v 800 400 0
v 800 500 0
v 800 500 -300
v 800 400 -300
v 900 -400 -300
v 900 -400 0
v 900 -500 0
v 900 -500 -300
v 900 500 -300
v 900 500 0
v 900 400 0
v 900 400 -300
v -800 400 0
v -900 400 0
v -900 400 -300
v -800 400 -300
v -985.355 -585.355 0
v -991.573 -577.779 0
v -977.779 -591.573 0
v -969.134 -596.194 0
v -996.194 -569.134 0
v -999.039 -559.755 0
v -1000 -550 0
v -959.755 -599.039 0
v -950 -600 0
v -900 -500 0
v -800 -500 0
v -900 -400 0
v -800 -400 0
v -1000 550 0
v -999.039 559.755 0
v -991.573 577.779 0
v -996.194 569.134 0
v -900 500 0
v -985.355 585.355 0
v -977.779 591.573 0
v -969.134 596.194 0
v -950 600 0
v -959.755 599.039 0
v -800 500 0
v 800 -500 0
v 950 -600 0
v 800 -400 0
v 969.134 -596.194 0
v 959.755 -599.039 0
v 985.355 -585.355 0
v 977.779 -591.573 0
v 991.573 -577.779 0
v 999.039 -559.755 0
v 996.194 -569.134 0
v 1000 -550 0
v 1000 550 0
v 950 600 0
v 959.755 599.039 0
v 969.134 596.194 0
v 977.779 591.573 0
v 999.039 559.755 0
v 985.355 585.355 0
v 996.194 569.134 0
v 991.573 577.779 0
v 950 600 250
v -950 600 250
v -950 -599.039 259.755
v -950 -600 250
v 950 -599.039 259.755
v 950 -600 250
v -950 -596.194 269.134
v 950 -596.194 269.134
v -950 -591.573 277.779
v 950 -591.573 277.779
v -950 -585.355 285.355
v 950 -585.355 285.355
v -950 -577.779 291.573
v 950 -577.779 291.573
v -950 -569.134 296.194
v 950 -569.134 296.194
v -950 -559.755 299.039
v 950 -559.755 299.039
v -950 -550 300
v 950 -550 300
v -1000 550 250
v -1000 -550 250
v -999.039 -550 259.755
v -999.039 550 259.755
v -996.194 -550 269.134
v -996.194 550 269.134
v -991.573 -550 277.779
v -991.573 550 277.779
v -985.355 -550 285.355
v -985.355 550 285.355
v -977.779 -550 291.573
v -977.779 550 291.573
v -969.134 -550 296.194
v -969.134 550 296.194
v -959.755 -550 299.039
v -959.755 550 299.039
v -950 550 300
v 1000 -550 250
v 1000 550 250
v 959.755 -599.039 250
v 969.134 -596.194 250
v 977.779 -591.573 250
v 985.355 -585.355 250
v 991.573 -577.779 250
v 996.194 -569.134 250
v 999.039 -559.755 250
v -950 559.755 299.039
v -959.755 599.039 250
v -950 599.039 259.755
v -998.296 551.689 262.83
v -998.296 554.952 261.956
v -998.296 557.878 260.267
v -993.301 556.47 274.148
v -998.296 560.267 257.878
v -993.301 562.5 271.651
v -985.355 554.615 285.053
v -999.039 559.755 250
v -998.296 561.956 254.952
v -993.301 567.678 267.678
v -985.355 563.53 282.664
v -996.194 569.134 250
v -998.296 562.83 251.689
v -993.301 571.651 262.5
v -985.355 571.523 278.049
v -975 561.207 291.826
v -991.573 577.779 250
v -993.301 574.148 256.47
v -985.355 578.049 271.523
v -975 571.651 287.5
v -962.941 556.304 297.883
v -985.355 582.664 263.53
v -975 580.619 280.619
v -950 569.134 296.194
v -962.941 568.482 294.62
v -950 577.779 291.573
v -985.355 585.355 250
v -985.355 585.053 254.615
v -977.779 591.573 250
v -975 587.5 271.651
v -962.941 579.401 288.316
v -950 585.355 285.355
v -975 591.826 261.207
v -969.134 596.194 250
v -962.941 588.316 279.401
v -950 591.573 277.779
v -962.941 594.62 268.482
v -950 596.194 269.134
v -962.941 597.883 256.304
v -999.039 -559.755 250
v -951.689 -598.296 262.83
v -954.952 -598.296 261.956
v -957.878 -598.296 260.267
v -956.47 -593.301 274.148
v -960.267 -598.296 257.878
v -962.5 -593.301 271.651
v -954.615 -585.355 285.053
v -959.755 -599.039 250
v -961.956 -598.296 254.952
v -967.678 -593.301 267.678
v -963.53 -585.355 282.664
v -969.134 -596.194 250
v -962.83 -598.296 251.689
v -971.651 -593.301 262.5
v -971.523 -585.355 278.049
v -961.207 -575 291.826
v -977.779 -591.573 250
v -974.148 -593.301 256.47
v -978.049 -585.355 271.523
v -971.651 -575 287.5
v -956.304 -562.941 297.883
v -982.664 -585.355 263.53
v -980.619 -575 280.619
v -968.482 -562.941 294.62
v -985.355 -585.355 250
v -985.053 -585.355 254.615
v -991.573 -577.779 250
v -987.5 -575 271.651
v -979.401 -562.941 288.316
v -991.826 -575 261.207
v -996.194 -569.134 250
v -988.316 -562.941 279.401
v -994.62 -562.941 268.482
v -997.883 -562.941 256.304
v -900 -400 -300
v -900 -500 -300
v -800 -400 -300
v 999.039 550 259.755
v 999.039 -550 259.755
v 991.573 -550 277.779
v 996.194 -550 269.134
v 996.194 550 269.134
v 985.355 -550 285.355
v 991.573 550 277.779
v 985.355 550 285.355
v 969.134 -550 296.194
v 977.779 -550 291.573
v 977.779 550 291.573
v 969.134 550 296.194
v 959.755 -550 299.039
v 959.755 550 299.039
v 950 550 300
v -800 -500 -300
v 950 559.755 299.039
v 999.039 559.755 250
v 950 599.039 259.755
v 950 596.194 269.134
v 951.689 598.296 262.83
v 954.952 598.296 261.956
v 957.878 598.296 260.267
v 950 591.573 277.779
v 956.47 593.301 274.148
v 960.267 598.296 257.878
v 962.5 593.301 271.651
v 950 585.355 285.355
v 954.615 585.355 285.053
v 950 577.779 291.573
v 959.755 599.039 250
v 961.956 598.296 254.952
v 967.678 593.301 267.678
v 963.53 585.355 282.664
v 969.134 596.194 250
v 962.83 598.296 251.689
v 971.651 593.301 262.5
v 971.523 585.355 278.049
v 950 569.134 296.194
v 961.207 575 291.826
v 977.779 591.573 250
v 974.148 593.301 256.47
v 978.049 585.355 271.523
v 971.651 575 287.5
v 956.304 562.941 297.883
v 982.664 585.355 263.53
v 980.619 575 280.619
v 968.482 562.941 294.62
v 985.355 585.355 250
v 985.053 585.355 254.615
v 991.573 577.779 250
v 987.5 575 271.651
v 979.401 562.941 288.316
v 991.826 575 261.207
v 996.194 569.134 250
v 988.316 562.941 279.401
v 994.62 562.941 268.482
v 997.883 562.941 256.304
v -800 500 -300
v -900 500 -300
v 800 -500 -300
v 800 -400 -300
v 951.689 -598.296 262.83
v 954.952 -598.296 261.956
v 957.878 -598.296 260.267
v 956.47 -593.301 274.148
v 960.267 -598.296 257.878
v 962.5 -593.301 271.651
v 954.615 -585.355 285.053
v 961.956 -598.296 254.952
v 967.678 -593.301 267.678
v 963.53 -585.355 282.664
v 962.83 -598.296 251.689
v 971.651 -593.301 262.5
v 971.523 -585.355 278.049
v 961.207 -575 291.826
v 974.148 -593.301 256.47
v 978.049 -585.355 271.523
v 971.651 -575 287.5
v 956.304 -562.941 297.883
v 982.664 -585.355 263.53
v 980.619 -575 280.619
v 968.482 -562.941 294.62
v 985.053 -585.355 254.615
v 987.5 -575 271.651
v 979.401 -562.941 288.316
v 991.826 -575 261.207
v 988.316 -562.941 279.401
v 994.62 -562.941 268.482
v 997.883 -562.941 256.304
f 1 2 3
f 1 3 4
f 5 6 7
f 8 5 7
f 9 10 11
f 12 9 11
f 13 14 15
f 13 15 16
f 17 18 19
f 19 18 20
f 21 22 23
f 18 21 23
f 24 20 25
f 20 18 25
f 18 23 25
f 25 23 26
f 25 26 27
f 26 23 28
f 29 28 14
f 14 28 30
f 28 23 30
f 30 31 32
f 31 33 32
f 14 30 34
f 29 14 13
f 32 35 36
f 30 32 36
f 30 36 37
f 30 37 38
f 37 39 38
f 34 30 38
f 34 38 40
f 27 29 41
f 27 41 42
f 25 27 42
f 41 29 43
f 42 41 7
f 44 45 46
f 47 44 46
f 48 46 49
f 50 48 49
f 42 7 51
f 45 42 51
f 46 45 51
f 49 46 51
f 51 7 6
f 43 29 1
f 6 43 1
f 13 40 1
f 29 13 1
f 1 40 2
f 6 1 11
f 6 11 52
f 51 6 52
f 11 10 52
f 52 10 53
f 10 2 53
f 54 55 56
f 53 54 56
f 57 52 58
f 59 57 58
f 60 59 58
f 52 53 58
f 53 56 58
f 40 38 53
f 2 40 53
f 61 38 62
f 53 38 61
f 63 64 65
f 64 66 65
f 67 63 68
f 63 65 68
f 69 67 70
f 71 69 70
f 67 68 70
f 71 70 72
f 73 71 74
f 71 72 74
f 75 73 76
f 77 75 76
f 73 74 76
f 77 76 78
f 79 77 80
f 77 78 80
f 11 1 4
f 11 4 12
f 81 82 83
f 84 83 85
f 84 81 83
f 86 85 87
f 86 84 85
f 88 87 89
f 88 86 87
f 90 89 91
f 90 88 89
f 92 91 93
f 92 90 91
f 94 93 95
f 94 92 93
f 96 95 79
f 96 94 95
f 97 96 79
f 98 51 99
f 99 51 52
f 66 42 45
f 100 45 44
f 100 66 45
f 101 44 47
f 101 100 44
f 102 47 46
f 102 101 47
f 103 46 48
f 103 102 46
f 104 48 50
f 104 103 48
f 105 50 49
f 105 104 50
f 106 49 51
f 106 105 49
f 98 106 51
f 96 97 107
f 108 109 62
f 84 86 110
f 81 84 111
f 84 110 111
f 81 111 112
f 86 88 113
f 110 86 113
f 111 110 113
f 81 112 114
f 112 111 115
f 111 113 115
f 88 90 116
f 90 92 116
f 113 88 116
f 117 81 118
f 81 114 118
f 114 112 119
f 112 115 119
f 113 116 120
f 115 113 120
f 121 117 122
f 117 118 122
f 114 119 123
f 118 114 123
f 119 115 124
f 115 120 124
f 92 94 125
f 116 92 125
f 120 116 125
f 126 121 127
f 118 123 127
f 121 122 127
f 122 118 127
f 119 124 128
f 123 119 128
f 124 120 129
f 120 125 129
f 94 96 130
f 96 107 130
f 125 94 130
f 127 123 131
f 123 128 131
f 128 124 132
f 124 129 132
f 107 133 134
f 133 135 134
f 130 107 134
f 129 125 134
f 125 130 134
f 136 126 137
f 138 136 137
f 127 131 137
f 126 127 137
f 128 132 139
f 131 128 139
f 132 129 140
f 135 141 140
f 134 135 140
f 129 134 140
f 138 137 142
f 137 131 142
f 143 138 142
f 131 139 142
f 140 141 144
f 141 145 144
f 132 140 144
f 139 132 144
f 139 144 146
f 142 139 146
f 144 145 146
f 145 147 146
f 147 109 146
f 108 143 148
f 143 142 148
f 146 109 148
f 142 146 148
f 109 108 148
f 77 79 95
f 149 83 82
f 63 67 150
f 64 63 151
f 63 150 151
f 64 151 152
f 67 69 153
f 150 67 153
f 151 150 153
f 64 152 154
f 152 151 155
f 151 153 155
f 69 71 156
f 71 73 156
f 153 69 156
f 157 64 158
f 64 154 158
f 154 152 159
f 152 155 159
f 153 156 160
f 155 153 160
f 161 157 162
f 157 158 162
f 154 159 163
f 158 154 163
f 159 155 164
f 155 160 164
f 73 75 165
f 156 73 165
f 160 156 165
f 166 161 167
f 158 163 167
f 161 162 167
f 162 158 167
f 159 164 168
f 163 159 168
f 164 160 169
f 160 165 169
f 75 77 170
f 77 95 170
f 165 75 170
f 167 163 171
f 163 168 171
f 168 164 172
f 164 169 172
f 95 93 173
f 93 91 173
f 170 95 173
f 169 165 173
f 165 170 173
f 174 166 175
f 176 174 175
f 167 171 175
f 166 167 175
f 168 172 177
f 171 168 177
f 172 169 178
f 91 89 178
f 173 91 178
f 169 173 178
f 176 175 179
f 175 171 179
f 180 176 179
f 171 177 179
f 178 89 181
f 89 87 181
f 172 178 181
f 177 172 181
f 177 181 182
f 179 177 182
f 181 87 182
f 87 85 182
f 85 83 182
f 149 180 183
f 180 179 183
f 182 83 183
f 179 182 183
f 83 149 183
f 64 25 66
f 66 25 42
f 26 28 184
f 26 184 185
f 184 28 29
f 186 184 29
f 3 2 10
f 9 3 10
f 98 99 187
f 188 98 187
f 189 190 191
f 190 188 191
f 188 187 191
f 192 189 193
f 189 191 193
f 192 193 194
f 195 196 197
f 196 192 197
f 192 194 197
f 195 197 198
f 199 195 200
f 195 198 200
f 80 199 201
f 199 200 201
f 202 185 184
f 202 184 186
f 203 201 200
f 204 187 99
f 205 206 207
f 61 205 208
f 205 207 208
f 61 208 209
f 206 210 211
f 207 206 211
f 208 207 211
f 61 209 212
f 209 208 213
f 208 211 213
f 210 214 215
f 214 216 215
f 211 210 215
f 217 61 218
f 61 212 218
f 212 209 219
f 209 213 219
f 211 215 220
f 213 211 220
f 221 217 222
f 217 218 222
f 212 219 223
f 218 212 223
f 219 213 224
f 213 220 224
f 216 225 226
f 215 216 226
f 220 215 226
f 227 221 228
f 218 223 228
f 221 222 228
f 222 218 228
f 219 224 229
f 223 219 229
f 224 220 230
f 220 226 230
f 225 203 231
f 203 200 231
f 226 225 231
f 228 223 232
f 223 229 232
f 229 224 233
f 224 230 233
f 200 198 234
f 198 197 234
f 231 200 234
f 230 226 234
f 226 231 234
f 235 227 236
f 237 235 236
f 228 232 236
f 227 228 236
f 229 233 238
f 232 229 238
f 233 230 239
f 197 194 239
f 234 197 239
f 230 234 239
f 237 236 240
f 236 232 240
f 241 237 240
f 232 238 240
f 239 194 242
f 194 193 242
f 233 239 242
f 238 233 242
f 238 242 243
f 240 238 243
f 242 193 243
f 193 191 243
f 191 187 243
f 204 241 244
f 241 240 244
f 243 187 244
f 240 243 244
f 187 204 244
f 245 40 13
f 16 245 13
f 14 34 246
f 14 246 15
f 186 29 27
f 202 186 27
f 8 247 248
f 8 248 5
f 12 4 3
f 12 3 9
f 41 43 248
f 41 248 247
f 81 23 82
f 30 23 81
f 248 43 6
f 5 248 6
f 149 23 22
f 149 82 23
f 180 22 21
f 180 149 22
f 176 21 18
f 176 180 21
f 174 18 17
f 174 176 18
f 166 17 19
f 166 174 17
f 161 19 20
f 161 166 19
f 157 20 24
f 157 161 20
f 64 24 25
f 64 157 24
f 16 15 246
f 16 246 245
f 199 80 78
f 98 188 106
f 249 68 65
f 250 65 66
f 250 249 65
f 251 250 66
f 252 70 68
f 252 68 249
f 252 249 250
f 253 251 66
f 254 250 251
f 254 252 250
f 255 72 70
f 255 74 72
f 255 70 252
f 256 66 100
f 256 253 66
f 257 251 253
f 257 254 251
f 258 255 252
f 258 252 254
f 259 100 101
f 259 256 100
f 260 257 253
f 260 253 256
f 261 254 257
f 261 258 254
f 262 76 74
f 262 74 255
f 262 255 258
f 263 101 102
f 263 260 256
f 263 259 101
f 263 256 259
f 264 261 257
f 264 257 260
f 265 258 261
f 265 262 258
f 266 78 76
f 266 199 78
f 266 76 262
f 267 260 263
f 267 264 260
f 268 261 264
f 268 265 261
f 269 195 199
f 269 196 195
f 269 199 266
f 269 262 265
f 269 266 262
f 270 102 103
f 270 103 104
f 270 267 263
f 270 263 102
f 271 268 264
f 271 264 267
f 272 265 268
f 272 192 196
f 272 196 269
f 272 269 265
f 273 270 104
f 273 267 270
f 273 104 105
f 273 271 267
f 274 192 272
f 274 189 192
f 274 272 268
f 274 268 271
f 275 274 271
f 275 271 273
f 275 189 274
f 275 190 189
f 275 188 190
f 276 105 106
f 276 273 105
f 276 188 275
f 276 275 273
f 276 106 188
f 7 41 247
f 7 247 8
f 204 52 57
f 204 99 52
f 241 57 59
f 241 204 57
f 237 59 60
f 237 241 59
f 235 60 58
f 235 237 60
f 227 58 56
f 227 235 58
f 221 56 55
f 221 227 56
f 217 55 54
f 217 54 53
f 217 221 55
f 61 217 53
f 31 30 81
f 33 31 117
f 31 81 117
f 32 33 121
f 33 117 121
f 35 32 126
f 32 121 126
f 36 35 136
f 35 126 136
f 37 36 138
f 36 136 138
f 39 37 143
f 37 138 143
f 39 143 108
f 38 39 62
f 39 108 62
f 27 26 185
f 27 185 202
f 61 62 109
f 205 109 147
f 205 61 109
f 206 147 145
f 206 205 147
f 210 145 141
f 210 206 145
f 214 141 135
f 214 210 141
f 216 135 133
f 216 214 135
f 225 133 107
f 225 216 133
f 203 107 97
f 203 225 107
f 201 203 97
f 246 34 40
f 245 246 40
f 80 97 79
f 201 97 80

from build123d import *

# Parameters (mm, degrees)
F0_W     = 2000
F0_H     = 1200
F1_DEPTH = 300
F2_R     = 50
F3_W     = 100
F3_H     = 100
F4_DEPTH = 300


with BuildPart() as f1:
    # F0 (on Top) → F1 (new body)
    with BuildSketch(Plane.XY):
        Rectangle(F0_W, F0_H)
    extrude(amount=F1_DEPTH)

    # F2
    f2_edges = [f1.edges().sort_by_distance(p)[0] for p in [
        (1000, 0, 300),
        (0, 600, 300),
        (-1000, 0, 300),
        (0, -600, 300),
        (-1000, -600, 150),
        (1000, -600, 150),
        (1000, 600, 150),
        (-1000, 600, 150),
    ]]
    fillet(f2_edges, radius=F2_R)

    # F3 (on face) → F4 (join)
    with BuildSketch(Plane(origin=(0, 0, 0), x_dir=(1, 0, 0), z_dir=(0, 0, -1))):
        with Locations((-850, 450)):
            Rectangle(F3_W, F3_H)
        with Locations((850, 450)):
            Rectangle(F3_W, F3_H)
        with Locations((-850, -450)):
            Rectangle(F3_W, F3_H)
        with Locations((850, -450)):
            Rectangle(F3_W, F3_H)
    extrude(amount=F4_DEPTH)


solid = f1.part
